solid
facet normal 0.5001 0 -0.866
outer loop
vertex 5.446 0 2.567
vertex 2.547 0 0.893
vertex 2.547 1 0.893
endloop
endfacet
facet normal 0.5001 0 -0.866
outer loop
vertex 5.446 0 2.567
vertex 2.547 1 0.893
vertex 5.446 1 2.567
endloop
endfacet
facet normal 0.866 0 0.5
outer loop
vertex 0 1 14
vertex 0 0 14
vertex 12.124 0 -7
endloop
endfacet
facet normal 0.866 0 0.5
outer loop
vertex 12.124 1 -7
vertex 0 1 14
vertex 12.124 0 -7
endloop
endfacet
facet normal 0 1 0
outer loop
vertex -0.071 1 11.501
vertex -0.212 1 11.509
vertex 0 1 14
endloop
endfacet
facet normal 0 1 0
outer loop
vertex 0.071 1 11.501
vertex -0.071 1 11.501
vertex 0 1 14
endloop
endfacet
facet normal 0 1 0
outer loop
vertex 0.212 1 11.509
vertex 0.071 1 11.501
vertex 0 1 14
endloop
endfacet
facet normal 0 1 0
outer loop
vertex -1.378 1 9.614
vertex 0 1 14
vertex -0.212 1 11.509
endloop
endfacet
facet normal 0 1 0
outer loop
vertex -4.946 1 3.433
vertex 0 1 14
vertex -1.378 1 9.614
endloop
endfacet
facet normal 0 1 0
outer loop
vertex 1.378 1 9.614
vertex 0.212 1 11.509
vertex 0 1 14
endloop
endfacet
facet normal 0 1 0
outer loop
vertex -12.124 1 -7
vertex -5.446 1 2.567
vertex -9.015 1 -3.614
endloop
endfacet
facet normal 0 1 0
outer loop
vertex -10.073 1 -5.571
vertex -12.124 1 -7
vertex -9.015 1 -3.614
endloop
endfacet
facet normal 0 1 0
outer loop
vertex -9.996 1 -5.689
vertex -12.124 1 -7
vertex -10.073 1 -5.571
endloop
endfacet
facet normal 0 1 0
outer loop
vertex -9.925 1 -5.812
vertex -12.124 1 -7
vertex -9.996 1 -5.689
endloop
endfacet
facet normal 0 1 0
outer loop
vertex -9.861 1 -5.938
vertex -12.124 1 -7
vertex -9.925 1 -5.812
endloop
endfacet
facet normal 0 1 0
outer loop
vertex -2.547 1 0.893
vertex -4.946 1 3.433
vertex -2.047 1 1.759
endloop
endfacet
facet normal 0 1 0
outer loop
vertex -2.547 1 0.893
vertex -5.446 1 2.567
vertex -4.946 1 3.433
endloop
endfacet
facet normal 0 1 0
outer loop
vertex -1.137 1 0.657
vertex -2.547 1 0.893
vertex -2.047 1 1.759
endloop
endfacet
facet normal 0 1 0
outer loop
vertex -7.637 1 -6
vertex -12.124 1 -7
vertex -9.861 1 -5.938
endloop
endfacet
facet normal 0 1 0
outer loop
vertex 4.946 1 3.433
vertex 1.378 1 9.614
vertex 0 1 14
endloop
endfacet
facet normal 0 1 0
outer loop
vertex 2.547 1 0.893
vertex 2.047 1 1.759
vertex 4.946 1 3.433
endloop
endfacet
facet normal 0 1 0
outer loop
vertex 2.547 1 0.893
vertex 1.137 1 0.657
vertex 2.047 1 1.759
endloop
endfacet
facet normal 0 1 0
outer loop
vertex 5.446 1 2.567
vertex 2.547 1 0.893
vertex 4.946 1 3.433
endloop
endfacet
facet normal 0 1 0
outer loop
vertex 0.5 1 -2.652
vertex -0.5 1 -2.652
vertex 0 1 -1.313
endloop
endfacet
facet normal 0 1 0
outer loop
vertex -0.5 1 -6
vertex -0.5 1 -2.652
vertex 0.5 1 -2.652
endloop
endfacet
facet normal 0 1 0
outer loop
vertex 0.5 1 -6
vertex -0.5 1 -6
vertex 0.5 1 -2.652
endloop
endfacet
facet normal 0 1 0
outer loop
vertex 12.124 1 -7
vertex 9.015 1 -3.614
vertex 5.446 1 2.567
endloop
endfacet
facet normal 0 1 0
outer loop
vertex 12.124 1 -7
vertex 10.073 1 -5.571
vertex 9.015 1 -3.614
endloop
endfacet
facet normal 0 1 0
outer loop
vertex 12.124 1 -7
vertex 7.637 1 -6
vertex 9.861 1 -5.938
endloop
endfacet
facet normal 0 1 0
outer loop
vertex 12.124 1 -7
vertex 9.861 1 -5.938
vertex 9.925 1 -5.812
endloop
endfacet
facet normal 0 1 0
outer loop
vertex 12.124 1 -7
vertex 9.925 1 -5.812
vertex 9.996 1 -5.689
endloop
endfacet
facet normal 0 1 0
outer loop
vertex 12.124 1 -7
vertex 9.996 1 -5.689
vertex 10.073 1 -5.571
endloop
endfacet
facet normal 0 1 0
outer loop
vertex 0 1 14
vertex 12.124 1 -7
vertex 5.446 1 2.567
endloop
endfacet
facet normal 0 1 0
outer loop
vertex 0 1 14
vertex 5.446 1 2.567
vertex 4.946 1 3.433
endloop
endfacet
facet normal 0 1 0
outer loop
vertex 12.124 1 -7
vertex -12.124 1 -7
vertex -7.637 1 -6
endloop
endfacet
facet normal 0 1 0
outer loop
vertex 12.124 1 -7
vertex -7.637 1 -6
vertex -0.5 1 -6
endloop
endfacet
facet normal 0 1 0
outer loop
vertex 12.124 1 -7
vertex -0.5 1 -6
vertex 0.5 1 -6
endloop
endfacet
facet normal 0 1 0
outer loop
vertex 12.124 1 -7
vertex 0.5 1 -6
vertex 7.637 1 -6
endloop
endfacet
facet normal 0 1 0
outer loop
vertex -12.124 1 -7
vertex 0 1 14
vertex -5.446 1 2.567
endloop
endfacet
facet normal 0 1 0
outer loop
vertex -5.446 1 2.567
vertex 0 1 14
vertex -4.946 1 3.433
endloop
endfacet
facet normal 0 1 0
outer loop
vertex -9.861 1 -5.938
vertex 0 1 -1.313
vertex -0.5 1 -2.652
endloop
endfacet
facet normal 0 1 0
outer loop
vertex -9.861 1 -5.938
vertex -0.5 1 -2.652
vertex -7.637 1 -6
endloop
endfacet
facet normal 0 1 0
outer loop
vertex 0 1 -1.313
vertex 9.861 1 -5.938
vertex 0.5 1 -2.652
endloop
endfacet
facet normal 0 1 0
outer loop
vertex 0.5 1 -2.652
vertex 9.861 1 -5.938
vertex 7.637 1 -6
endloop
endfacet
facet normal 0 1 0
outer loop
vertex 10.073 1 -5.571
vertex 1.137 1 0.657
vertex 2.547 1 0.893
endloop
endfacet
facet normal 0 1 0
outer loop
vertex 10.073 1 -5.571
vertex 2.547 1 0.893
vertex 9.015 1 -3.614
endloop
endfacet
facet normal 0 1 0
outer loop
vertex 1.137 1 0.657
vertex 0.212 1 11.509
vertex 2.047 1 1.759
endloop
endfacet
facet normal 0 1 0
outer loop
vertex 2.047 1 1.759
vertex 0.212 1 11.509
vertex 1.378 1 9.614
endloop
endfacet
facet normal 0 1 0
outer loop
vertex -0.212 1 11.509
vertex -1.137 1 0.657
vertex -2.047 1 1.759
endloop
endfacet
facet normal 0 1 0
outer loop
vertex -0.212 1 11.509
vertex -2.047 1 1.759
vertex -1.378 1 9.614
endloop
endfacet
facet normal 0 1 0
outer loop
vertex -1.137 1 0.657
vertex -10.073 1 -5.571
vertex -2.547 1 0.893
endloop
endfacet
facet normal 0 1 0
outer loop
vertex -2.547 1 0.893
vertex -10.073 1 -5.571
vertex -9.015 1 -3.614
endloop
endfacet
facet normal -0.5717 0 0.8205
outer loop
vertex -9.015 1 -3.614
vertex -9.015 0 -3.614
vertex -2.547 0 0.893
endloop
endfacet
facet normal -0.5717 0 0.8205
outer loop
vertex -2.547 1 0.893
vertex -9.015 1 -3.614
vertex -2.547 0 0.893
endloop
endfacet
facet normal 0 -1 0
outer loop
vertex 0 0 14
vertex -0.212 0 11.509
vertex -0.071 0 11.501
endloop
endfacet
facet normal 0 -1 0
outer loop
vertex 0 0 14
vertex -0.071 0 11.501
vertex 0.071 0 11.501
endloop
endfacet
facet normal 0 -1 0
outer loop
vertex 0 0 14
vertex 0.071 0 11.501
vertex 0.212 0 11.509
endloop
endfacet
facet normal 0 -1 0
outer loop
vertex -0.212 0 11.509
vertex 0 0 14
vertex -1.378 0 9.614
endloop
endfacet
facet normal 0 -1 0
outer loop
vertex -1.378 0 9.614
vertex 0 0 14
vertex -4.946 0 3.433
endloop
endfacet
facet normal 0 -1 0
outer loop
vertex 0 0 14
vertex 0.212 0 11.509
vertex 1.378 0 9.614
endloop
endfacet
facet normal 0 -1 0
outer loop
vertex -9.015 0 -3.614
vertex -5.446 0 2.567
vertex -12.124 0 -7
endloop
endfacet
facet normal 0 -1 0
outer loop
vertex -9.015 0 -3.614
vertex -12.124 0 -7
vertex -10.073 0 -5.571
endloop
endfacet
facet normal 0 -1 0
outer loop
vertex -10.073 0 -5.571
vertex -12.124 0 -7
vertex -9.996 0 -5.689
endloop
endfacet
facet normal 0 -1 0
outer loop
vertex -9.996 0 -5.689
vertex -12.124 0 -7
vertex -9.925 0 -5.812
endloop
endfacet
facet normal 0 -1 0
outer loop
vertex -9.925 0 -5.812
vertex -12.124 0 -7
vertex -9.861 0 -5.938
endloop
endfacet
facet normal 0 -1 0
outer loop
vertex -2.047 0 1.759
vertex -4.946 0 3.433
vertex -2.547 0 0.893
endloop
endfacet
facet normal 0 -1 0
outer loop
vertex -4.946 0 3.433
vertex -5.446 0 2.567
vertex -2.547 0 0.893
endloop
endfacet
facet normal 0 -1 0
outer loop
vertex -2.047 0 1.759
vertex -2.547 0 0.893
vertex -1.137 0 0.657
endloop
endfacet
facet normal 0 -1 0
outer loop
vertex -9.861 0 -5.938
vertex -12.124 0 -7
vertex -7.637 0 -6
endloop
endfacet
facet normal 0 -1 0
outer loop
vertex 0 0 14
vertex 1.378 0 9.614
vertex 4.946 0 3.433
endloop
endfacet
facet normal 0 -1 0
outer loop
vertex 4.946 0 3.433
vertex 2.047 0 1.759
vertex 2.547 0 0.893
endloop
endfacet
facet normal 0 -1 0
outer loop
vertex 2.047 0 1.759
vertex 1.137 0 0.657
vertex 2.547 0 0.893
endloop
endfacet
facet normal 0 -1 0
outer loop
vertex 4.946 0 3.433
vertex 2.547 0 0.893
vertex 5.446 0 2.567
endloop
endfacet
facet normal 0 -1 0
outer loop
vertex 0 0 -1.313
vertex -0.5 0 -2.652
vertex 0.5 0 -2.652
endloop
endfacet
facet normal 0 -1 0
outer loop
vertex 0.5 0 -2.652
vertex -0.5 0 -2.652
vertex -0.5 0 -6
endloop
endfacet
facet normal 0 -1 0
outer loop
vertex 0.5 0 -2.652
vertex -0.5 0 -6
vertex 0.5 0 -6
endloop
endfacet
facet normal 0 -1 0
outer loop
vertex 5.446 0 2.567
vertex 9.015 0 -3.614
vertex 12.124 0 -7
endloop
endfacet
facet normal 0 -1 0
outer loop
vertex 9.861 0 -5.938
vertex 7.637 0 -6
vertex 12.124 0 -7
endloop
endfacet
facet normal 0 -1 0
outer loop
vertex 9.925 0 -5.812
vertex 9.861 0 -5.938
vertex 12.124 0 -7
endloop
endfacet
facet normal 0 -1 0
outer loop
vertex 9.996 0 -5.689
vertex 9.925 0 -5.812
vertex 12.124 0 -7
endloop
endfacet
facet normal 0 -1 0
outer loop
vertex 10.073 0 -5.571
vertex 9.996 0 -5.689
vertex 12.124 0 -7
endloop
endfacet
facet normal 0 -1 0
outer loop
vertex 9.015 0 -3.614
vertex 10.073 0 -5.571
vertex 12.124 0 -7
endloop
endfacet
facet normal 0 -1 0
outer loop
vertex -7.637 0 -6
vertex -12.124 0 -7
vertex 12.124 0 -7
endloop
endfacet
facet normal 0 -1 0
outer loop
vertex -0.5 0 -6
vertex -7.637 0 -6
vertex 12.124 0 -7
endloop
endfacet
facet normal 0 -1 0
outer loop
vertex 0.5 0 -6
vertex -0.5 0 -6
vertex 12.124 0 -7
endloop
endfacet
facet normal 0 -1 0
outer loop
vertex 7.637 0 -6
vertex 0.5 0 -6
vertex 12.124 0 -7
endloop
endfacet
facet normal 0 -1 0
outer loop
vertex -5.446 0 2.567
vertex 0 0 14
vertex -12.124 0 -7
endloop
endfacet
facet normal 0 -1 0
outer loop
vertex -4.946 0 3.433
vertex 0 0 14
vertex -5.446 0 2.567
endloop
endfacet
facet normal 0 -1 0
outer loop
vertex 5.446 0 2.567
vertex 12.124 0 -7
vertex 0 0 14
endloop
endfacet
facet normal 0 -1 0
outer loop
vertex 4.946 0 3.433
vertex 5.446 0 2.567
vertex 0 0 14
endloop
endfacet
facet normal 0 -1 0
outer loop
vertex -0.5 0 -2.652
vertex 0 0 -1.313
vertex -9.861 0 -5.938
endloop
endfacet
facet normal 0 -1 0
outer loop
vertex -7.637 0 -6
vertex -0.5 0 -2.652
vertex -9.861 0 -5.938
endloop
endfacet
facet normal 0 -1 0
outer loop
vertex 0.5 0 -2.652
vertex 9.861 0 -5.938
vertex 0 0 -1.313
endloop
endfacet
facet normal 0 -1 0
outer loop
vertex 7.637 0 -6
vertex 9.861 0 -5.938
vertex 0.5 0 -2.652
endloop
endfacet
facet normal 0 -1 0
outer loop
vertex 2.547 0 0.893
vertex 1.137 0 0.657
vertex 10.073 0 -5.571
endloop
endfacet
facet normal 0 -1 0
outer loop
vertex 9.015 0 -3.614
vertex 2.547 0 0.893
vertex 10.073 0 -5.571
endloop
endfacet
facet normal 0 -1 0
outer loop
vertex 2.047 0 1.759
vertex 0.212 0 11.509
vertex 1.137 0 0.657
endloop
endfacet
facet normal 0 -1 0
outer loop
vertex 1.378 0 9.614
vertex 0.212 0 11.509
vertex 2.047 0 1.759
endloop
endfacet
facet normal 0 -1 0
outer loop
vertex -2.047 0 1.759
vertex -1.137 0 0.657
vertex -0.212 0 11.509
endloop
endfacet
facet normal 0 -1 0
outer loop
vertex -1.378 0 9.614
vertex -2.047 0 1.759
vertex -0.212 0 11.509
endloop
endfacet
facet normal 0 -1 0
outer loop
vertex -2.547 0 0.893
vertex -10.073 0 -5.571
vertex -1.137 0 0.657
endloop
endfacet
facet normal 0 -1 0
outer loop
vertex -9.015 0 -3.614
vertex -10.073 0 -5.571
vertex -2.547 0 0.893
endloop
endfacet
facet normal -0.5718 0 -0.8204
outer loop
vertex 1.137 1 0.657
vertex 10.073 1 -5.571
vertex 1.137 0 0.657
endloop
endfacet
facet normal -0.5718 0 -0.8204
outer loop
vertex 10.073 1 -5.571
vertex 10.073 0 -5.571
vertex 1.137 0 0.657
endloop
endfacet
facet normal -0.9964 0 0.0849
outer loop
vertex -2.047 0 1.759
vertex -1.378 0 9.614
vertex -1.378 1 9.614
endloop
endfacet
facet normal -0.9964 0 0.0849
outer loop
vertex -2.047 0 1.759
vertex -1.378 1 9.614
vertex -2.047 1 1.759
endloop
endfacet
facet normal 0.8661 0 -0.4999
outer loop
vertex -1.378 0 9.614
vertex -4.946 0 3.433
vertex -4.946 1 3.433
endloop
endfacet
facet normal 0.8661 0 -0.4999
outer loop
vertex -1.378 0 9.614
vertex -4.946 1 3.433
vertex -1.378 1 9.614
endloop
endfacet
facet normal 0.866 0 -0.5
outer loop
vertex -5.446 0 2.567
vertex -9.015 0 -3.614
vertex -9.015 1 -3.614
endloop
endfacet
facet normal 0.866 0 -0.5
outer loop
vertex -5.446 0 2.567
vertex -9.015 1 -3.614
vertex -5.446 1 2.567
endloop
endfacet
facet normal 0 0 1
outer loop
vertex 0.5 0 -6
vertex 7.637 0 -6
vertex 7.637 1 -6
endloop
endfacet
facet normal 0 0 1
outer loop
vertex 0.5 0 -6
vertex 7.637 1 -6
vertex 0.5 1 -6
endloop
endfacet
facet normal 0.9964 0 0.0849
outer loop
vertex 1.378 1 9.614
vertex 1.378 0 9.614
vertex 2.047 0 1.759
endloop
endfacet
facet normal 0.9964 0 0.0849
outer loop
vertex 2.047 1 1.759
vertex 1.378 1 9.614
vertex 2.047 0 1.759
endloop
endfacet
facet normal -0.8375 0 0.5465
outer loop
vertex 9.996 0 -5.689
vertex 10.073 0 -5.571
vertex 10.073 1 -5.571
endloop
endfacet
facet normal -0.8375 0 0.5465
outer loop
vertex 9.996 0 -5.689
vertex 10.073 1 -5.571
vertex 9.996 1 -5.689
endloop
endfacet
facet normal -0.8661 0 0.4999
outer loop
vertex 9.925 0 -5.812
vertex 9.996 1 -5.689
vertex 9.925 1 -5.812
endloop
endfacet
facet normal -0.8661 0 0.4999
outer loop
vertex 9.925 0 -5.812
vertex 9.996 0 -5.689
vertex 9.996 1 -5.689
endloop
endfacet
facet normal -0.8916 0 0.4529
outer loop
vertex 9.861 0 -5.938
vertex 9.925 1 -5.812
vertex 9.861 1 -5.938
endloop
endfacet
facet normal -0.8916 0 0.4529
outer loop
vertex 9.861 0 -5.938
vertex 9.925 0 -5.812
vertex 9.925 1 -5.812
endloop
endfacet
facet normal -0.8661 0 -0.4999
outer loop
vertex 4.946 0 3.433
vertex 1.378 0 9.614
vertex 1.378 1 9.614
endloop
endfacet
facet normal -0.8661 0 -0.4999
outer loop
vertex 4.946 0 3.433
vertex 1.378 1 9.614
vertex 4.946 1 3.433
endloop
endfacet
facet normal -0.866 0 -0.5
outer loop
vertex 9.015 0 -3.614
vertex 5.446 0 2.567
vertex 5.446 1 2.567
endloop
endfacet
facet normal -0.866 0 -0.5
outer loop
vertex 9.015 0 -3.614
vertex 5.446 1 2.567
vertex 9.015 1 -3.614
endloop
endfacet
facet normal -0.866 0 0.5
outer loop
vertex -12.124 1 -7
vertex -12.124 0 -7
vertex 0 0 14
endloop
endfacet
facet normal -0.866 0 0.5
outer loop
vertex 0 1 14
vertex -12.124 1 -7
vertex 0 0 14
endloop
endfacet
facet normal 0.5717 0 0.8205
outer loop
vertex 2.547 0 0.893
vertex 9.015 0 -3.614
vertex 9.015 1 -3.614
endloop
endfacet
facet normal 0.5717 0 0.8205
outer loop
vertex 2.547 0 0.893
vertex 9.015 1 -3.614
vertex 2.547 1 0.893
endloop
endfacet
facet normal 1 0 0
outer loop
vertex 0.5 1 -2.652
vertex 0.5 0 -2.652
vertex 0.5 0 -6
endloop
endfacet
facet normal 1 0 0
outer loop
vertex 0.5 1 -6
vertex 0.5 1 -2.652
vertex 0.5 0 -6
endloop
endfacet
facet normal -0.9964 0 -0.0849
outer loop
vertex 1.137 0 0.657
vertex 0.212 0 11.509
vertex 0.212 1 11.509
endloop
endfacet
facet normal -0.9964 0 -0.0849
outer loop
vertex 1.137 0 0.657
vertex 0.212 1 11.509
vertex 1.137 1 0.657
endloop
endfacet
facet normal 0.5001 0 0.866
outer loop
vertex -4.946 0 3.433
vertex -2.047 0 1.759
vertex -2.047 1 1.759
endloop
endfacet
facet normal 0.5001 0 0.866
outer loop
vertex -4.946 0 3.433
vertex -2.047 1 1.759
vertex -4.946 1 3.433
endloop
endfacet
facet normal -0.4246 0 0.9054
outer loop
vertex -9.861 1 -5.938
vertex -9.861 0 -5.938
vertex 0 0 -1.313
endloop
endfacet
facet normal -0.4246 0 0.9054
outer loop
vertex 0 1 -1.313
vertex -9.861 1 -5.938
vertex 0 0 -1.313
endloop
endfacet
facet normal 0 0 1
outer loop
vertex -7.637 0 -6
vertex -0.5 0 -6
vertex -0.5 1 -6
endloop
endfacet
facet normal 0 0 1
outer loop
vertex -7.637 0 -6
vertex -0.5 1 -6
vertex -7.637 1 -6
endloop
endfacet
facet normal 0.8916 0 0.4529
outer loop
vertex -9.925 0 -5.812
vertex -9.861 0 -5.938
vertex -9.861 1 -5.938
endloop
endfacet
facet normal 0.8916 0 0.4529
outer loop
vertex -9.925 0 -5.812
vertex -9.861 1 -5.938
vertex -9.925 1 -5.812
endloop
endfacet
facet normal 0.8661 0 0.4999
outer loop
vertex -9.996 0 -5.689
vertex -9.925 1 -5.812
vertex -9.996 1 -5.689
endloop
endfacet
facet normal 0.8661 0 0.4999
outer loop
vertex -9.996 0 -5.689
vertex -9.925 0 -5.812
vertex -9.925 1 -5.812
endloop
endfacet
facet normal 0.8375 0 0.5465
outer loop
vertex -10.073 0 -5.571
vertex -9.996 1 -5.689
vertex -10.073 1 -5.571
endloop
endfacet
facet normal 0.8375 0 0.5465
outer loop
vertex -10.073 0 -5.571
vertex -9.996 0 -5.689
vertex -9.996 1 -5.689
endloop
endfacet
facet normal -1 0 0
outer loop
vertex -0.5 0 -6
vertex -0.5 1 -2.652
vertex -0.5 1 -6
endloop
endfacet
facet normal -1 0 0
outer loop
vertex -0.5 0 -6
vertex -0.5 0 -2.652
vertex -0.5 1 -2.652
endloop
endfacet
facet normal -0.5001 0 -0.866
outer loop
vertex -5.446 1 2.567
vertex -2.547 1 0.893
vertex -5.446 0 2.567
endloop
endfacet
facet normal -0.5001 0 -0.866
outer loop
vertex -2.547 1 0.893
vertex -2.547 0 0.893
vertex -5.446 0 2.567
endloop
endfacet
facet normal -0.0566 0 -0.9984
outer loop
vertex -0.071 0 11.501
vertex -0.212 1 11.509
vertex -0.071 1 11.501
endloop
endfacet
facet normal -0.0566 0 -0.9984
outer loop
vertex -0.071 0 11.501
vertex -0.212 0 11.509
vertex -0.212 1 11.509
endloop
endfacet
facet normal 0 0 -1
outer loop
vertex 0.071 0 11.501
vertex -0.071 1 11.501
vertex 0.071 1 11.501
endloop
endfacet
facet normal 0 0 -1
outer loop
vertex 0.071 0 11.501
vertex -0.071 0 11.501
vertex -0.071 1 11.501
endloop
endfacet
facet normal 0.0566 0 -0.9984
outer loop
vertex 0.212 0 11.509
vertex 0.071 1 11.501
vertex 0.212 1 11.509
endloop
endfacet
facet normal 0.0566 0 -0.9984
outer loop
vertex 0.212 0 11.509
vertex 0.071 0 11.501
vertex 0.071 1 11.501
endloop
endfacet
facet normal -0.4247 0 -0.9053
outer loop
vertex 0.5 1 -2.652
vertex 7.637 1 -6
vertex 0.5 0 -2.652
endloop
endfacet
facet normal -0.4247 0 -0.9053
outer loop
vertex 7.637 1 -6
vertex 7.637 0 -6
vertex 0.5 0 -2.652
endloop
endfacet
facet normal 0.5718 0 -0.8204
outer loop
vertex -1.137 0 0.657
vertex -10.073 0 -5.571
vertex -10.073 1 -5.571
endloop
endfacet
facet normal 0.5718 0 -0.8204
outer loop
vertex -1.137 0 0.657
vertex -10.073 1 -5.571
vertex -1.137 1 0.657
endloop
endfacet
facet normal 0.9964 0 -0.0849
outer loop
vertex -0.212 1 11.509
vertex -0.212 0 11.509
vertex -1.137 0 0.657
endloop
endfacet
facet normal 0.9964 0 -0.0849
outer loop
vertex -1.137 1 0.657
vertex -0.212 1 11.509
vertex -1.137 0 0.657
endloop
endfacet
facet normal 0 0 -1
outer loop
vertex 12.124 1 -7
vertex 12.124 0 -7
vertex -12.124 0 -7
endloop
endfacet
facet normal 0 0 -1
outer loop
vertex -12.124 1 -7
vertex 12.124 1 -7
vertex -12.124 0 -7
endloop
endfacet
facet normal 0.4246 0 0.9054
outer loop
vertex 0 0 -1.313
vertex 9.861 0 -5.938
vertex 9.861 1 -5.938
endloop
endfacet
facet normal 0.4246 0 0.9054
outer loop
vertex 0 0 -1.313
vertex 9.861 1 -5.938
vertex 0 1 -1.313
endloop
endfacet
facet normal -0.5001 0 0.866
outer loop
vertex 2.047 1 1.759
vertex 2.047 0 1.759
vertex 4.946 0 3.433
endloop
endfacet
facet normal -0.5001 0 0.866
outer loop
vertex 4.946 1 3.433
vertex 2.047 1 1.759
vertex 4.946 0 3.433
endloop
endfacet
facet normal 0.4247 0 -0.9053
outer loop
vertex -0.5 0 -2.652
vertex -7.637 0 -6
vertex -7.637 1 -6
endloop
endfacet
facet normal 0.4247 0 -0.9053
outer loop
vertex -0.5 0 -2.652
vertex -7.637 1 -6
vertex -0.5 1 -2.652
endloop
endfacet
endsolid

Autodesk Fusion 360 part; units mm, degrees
sketch "草图1" plane through (0, 0, 0) normal (0, 1, 0) x (1, 0, 0)
  line L0 (2.4024, -17.839) -> (16.6502, 6.839)
  line L1 (-16.6502, 6.839) -> (-2.4024, -17.839)
  arc A0 (-14.2478, 11) -> (-16.6502, 6.839) centre (0, 0) ccw
  line L2 (14.2478, 11) -> (-14.2478, 11)
  arc A1 (16.6502, 6.839) -> (14.2478, 11) centre (0, 0) ccw
  arc A2 (-2.4024, -17.839) -> (2.4024, -17.839) centre (0, 0) ccw
  line L3 (12.1244, 7) -> (-12.1244, 7)
  line L4 (-12.1244, 7) -> (0, -14)
  line L5 (0, -14) -> (12.1244, 7)
  line L6 (0, -14) -> (1.1374, -0.6567)
  line L7 (12.1244, 7) -> (1.1374, -0.6567)
  line L8 (1.3775, -9.6141) -> (2.0939, -1.2089)
  line L9 (9.0148, 3.6141) -> (2.0939, -1.2089)
  line L10 (2.047, -1.7592) -> (4.9462, -3.433)
  line L11 (2.547, -0.8932) -> (5.4462, -2.567)
  line L12 (1.3775, -9.6141) -> (4.9462, -3.433)
  line L13 (5.4462, -2.567) -> (9.0148, 3.6141)
  line L14 (12.1244, 7) -> (0, 1.3134)
  line L15 (7.6373, 6) -> (0, 2.4179)
  line L16 (0.5, 2.6524) -> (0.5, 6)
  line L17 (-0.5, 2.6524) -> (-0.5, 6)
  line L18 (-7.6373, 6) -> (0, 2.4179)
  line L19 (-12.1244, 7) -> (0, 1.3134)
  line L20 (-0.5, 6) -> (-7.6373, 6)
  line L21 (7.6373, 6) -> (0.5, 6)
  line L22 (-12.1244, 7) -> (-1.1374, -0.6567)
  line L23 (-9.0148, 3.6141) -> (-2.0939, -1.2089)
  line L24 (-2.547, -0.8932) -> (-5.4462, -2.567)
  line L25 (-2.047, -1.7592) -> (-4.9462, -3.433)
  line L26 (-1.3775, -9.6141) -> (-2.0939, -1.2089)
  line L27 (0, -14) -> (-1.1374, -0.6567)
  line L28 (-4.9462, -3.433) -> (-1.3775, -9.6141)
  line L29 (-9.0148, 3.6141) -> (-5.4462, -2.567)
  circle A3 centre (0, -14) radius 2.5
  circle A4 centre (12.1244, 7) radius 2.5
  circle A5 centre (-12.1244, 7) radius 2.5
  dimension "d1" = -4
  dimension "d6" = 360
  dimension "d7" = 5
  dimension "d9" = 360
extrude "拉伸1" add sketch "草图1" along normal blind 1 contours L3 L19 A5 | L3 L14 L19 A4 A5 | L4 L22 A5 | L19 L22 A5 | L3 L14 A4 | L4 L22 L27 A3 A5 | L5 L7 A4 | L7 L14 A4 | L4 L27 A3 | L5 L6 L7 A3 A4 | L5 L6 A3 | L6 L27 A3
